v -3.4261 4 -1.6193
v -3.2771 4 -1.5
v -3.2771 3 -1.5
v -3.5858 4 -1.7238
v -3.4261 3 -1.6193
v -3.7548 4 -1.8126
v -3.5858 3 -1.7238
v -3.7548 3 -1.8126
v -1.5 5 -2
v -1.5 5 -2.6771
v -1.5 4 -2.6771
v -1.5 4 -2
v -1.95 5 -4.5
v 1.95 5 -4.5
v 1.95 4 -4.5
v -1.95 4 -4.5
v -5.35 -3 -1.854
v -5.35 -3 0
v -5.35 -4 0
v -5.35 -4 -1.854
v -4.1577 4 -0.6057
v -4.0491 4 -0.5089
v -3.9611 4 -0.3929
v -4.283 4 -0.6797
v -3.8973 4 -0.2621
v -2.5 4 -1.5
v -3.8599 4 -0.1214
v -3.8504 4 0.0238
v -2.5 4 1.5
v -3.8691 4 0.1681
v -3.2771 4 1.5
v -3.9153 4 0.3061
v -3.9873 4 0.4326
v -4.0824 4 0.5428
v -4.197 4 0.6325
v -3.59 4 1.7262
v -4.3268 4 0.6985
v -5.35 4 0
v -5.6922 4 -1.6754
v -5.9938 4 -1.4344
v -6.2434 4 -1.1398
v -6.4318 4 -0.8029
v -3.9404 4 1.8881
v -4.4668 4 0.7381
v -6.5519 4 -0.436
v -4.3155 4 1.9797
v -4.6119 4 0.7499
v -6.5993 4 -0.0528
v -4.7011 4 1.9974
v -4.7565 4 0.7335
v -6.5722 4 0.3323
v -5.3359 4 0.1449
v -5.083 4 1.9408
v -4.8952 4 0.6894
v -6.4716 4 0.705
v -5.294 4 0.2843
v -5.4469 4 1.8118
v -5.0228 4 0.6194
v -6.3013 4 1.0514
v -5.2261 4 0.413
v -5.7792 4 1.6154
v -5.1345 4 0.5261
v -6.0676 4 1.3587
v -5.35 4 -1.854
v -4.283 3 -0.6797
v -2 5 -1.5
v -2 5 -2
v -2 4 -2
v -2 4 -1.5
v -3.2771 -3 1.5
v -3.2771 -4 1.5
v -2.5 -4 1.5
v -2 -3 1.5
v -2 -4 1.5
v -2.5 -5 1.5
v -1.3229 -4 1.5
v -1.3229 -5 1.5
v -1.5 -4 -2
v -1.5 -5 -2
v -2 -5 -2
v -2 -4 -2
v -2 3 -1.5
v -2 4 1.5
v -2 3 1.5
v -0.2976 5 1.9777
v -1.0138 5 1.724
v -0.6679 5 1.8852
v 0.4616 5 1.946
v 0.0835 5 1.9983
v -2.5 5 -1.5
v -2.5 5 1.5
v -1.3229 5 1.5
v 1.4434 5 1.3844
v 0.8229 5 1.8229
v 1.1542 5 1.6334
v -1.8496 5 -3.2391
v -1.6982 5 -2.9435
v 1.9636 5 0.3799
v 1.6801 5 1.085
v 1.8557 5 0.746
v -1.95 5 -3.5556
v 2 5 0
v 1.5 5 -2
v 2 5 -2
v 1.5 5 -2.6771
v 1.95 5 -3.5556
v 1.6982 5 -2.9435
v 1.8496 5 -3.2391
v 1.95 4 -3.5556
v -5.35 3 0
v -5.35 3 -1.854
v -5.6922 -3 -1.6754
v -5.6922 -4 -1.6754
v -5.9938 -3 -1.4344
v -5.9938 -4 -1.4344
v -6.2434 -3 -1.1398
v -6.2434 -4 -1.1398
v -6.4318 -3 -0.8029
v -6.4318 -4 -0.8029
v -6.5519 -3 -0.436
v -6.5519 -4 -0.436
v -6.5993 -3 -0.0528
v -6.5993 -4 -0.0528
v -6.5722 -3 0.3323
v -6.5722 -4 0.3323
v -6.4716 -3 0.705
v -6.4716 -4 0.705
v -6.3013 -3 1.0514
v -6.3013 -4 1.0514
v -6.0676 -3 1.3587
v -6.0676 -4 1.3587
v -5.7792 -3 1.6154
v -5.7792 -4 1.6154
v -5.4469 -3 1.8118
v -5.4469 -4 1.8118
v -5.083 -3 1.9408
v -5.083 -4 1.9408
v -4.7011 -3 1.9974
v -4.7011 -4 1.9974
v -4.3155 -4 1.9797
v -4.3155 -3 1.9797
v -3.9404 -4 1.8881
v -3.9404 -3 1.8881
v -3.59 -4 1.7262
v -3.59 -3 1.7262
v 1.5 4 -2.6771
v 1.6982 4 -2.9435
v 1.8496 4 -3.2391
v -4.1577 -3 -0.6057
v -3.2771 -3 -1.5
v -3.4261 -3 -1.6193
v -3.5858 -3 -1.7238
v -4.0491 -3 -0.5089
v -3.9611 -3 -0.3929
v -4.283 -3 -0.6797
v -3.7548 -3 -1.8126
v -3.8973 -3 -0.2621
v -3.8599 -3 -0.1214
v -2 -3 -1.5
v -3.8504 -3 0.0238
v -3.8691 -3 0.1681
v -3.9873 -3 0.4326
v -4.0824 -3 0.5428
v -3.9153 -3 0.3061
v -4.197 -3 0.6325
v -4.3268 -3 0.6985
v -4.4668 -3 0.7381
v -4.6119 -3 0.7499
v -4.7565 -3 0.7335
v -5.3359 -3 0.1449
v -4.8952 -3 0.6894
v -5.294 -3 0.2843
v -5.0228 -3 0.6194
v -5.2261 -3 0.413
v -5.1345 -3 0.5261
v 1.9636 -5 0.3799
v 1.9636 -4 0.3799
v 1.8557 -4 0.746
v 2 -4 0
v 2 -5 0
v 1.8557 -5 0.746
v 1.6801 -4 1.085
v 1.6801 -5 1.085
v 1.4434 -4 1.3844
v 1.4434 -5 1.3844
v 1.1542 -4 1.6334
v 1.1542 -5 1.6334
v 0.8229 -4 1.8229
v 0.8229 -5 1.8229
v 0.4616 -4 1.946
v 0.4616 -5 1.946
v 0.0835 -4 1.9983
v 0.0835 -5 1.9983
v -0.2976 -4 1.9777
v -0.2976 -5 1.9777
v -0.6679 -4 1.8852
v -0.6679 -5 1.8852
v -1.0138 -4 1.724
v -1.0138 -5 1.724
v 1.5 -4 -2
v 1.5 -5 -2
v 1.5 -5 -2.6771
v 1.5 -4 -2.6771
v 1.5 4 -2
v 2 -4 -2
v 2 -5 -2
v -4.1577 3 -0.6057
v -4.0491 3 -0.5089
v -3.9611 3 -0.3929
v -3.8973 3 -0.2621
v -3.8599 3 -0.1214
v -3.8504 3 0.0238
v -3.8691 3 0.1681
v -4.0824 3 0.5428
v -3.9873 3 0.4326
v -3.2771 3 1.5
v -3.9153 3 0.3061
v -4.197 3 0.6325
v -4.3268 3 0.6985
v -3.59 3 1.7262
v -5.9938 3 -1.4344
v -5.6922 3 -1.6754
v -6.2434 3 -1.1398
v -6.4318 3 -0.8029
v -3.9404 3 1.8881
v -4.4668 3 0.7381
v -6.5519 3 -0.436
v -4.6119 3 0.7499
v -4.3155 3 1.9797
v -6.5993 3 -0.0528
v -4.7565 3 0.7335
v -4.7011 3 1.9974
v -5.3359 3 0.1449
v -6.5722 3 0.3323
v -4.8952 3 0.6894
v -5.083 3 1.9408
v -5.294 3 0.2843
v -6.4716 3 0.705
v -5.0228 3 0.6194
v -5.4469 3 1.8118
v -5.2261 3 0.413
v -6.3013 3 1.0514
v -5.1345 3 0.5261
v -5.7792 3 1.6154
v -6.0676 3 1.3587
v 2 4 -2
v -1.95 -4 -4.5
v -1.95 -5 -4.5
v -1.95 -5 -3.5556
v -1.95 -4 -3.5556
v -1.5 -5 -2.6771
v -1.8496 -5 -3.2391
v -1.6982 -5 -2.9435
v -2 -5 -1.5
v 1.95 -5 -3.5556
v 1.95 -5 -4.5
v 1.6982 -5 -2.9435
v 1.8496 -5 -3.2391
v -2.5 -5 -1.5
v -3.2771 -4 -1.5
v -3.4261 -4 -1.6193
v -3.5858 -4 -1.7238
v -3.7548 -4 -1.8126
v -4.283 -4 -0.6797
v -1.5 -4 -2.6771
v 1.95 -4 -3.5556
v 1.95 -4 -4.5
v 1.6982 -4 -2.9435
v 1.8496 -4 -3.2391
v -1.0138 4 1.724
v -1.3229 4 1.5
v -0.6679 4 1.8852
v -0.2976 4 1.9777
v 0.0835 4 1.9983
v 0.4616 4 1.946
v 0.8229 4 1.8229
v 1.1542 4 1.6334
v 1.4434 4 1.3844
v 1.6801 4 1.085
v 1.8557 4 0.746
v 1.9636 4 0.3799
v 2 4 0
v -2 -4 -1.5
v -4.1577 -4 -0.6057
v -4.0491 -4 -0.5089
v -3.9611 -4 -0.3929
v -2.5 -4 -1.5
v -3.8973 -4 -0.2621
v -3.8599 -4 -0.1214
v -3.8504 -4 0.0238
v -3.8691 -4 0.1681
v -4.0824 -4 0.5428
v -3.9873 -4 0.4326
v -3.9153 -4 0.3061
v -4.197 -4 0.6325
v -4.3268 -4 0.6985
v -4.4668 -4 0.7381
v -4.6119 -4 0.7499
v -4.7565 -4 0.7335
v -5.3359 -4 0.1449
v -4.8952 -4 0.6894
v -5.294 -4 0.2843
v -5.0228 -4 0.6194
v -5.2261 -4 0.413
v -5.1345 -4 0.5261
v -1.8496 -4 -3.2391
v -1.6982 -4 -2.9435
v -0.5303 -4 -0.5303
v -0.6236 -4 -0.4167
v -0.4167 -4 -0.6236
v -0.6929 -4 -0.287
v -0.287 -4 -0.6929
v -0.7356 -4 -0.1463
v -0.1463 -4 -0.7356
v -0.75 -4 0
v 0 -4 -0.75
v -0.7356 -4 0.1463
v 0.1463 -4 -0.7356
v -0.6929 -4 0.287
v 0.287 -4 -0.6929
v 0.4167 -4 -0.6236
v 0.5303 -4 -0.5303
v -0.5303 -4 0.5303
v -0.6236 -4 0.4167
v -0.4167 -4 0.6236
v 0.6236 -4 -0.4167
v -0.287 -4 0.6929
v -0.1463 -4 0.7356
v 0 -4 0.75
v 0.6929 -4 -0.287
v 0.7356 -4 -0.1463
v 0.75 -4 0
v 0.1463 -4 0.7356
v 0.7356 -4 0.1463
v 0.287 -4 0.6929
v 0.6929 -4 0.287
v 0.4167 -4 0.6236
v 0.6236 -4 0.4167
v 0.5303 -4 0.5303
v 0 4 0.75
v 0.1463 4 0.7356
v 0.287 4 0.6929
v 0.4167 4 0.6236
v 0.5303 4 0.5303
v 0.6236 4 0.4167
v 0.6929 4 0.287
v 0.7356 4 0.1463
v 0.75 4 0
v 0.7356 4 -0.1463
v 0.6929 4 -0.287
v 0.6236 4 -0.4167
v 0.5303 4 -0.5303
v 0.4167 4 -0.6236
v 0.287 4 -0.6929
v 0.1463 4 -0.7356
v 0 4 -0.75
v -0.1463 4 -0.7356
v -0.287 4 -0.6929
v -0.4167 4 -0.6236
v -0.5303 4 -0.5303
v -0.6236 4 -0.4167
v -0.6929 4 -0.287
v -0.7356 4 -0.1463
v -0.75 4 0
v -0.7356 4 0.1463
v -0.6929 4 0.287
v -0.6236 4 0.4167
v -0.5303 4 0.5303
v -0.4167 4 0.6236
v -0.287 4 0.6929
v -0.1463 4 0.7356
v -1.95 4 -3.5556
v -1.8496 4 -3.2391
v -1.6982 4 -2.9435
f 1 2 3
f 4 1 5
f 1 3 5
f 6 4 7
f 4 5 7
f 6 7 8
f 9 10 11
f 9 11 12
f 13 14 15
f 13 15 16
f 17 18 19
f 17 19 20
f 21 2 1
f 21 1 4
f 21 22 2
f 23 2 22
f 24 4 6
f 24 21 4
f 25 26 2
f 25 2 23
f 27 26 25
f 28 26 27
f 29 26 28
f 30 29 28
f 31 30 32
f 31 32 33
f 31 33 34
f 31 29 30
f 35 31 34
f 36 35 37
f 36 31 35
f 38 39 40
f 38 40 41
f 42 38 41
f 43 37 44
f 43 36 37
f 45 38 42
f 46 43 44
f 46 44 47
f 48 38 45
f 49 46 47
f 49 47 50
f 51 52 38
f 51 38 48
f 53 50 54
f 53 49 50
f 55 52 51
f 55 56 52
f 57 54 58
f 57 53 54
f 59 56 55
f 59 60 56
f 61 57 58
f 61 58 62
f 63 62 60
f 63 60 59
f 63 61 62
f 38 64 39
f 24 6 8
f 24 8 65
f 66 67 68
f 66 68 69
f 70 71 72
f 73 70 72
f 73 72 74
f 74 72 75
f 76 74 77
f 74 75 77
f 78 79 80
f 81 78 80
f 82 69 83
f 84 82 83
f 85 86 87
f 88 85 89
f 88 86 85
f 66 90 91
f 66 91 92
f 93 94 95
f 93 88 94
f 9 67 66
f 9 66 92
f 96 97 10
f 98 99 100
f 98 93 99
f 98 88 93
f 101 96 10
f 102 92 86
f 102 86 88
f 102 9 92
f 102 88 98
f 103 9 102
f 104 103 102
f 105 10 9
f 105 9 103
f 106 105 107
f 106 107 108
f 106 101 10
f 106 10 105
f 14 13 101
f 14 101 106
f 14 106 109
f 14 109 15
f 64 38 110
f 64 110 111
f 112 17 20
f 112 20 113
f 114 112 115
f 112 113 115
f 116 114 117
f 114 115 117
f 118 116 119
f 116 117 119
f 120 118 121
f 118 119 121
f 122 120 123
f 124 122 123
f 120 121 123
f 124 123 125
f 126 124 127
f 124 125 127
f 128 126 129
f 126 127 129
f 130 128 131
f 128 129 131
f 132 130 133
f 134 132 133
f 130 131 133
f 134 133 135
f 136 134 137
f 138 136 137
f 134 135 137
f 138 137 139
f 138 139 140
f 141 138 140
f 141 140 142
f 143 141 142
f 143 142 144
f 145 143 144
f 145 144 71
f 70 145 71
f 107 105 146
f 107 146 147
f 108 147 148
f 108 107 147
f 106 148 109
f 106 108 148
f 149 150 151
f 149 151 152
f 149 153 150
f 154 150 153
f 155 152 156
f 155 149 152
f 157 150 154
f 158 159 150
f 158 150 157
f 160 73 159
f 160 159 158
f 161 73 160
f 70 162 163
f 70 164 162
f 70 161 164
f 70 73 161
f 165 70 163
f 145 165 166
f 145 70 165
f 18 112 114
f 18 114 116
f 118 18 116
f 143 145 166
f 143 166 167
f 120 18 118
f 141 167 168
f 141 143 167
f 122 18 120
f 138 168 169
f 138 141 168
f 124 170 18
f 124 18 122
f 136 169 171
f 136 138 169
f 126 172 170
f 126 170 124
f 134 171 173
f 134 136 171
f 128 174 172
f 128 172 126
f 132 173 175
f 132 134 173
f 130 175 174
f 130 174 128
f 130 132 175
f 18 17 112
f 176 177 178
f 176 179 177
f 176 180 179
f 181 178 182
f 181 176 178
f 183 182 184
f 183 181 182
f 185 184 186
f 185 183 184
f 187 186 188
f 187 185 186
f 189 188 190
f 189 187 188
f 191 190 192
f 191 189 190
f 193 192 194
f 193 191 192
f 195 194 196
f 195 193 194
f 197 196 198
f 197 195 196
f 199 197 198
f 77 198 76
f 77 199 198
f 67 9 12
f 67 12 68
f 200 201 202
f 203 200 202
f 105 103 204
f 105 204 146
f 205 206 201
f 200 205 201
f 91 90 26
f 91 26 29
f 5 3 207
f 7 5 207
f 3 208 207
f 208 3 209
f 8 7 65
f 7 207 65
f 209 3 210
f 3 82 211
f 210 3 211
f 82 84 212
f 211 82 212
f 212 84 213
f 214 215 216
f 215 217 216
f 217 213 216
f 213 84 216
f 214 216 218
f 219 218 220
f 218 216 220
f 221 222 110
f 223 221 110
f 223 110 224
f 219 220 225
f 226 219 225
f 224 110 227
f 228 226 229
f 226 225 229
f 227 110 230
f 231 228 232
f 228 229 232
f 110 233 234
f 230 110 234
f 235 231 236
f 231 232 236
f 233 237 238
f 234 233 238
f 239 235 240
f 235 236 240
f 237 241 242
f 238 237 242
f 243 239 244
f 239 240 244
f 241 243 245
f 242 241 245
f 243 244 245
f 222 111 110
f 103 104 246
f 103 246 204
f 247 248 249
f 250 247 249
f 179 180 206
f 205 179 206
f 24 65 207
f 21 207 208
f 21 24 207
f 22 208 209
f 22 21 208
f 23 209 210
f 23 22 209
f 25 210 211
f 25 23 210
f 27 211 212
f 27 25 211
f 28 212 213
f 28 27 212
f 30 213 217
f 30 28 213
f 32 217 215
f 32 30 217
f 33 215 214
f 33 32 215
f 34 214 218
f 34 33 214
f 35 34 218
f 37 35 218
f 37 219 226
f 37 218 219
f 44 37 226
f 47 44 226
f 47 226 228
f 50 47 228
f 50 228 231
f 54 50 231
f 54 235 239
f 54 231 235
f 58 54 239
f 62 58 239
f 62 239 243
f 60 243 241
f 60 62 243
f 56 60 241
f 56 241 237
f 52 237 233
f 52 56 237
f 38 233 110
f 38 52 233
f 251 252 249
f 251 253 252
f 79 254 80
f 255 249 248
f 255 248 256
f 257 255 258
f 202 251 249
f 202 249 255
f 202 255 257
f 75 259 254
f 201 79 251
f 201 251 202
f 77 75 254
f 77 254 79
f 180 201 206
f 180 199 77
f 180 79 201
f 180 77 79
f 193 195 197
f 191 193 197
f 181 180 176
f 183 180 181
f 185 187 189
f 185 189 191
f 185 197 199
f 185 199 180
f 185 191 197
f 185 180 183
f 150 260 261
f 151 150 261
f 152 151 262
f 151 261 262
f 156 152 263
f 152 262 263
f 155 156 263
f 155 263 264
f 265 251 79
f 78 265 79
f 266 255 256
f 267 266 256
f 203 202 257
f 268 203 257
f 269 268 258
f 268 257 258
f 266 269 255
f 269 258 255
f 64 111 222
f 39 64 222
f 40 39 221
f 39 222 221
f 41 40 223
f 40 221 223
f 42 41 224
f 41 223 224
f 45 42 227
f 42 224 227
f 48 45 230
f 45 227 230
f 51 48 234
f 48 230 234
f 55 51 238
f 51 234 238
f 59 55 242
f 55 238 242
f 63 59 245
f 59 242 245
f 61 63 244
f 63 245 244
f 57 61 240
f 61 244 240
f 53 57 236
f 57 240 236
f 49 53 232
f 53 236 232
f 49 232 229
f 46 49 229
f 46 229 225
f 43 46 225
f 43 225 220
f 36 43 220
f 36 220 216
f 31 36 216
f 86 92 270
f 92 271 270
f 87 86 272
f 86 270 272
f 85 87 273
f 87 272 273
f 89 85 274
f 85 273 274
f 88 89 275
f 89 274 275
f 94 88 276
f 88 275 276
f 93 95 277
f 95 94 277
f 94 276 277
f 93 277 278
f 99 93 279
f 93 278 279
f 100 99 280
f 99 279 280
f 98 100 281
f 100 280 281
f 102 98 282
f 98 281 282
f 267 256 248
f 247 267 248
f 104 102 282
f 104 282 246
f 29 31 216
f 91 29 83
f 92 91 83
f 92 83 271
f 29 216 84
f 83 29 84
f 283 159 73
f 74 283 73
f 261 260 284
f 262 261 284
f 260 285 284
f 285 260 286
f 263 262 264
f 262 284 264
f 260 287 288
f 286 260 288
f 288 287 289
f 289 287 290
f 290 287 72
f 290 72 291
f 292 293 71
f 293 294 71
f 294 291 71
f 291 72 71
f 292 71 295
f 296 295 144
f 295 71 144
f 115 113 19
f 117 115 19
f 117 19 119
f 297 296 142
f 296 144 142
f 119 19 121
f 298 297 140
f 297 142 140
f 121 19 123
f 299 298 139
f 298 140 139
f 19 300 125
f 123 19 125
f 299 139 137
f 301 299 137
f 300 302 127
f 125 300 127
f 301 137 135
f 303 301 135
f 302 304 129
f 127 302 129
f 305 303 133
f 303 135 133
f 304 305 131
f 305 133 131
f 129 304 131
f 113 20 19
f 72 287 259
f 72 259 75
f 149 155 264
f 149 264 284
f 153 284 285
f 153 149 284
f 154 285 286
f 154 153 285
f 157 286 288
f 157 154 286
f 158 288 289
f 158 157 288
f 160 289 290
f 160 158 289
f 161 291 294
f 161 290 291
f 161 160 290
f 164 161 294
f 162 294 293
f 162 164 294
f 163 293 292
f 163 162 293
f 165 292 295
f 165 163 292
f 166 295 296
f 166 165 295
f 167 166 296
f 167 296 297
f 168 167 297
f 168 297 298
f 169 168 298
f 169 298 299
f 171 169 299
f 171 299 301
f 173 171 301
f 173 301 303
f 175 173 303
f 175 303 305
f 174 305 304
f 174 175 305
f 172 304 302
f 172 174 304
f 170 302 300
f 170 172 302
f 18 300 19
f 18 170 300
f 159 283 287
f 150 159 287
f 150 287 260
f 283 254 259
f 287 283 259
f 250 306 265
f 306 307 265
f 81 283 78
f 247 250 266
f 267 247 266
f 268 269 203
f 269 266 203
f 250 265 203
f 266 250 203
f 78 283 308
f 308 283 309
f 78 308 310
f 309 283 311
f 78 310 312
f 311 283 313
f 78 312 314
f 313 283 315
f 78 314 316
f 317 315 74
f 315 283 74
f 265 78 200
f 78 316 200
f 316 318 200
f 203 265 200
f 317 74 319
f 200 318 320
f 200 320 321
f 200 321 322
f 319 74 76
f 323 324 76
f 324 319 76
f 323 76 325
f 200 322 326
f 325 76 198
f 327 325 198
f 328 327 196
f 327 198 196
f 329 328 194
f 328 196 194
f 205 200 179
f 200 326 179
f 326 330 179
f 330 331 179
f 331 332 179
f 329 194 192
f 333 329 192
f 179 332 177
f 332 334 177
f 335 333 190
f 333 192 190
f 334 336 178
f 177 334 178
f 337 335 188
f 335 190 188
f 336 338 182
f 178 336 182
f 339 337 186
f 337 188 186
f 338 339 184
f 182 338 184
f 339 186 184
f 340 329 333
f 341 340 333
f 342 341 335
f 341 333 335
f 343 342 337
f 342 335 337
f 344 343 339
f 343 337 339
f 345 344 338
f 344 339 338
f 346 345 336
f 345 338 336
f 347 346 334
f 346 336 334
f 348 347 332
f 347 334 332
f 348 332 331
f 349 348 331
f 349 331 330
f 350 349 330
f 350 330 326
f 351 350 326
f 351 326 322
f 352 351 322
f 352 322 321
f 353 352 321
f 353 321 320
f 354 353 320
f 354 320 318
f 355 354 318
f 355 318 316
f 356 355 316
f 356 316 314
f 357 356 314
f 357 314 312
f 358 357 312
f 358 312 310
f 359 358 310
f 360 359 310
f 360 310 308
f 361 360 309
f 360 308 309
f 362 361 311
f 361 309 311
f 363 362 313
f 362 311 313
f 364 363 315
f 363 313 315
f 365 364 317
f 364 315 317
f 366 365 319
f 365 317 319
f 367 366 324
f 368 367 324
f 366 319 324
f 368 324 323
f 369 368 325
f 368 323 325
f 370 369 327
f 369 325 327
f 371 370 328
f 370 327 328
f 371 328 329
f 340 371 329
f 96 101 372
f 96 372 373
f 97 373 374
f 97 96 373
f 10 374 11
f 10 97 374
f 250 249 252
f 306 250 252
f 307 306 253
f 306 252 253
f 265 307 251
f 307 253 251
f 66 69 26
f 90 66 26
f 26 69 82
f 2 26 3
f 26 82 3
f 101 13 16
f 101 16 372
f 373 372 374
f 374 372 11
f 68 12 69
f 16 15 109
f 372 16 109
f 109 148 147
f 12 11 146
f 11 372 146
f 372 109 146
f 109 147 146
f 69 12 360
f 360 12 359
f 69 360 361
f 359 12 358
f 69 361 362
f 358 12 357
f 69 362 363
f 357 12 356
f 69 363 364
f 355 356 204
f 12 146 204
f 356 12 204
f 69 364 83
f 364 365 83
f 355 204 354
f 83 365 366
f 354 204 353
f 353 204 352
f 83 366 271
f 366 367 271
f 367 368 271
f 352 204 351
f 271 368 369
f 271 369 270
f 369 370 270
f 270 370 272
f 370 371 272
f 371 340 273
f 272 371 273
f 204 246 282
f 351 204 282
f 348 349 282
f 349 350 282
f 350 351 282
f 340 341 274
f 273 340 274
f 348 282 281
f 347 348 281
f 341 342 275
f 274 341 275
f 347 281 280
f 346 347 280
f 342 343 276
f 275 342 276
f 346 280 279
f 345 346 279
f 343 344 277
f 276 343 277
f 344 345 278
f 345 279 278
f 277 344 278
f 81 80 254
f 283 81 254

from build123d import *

# Parameters (mm, degrees)
EXTRUDE_1_DEPTH      = 4
EXTRUDE_1_DEPTH_BACK = 4
SKETCH_1_R           = 0.75
SKETCH_2_R           = 2
EXTRUDE_2_DEPTH      = 1
EXTRUDE_START        = 1
SKETCH_3_R           = 2
EXTRUDE_3_DEPTH      = 1
SKETCH_6_W           = 1.5
SKETCH_6_H           = 3
EXTRUDE_6_DEPTH      = 1
SKETCH_7_W           = 1.5
SKETCH_7_H           = 3
EXTRUDE_8_DEPTH      = 1
SKETCH_8_W           = 3
SKETCH_8_H           = 2
EXTRUDE_9_DEPTH      = 0.5
EXTRUDE_10_DEPTH     = 1
EXTRUDE_START_2      = 7
EXTRUDE_11_DEPTH     = 1
CUT_EXTRUDE_1_DEPTH  = 12.338430226
EXTRUDE_12_DEPTH     = 1


with BuildPart() as part:
    # 草图1 → 凸台-拉伸1 (new, two sides: drawn at the far end of the back side and taken through both)
    with BuildSketch(Plane(origin=(0, 0, 0), x_dir=(1, 0, 0), z_dir=(0, 1, 0)).offset(-EXTRUDE_1_DEPTH_BACK)):
        with Locations(Location((0, 0, 0), (0, 0, 270))):
            Circle(SKETCH_1_R)
    extrude(amount=EXTRUDE_1_DEPTH + EXTRUDE_1_DEPTH_BACK)

    # 草图2 → 凸台-拉伸2 (add)
    with BuildSketch(Plane(origin=(0, 4, 0), x_dir=(-1, 0, 0), z_dir=(0, 1, 0))):
        with Locations(Location((0, 0, 0), (0, 0, 90))):
            Circle(SKETCH_2_R)
    extrude(amount=EXTRUDE_2_DEPTH)

    # 草图3 → 凸台-拉伸3 (add)
    with BuildSketch(Plane.XZ.offset(4).offset(EXTRUDE_START)):
        with Locations(Location((0, 0, 0), (0, 0, 90))):
            Circle(SKETCH_3_R)
    extrude(amount=-EXTRUDE_3_DEPTH)

    # 草图6 → 凸台-拉伸6 (add)
    with BuildSketch(Plane(origin=(0, 5, 0), x_dir=(-1, 0, 0), z_dir=(0, 1, 0))):
        with Locations((1.75, 0)):
            Rectangle(SKETCH_6_W, SKETCH_6_H)
    extrude(amount=-EXTRUDE_6_DEPTH)

    # 草图7 → 凸台-拉伸8 (add)
    with BuildSketch(Plane.XZ.offset(5)):
        with Locations((-1.75, 0)):
            Rectangle(SKETCH_7_W, SKETCH_7_H)
    extrude(amount=-EXTRUDE_8_DEPTH)

    # 草图8 → 凸台-拉伸9 (add)
    with BuildSketch(Plane.ZY.offset(2.5)):
        with Locations((0, 4)):
            Rectangle(SKETCH_8_W, SKETCH_8_H)
        with Locations((0, -4)):
            Rectangle(SKETCH_8_W, SKETCH_8_H)
    extrude(amount=-EXTRUDE_9_DEPTH)

    # 草图9 → 凸台-拉伸10 (add)
    with BuildSketch(Plane.XZ.offset(-3)):
        with BuildLine():
            Line((-2.5, -1.5), (-3.277124344, -1.5))
            ThreePointArc((-3.277124344, -1.5), (-6.6, 0), (-3.277124344, 1.5))
            Line((-3.277124344, 1.5), (-2.5, 1.5))
            Line((-2.5, 1.5), (-2.5, -1.5))
        make_face()
    extrude(amount=-EXTRUDE_10_DEPTH)

    # 草图9<2> → 凸台-拉伸11 (add)
    with BuildSketch(Plane.XZ.offset(-3).offset(EXTRUDE_START_2)):
        with BuildLine():
            Line((-2.5, -1.5), (-3.277124344, -1.5))
            ThreePointArc((-3.277124344, -1.5), (-6.6, 0), (-3.277124344, 1.5))
            Line((-3.277124344, 1.5), (-2.5, 1.5))
            Line((-2.5, 1.5), (-2.5, -1.5))
        make_face()
    extrude(amount=-EXTRUDE_11_DEPTH)

    # 草图10 → 切除-拉伸1 (cut, through all)
    with BuildSketch(Plane(origin=(0, 4, 0), x_dir=(-1, 0, 0), z_dir=(0, 1, 0))):
        with BuildLine():
            Line((5.35, 0), (5.35, -1.854049622))
            ThreePointArc((5.35, -1.854049622), (4.548070298, -1.999325713), (3.754763477, -1.812615574))
            Line((3.754763477, -1.812615574), (4.283036304, -0.67973084))
            ThreePointArc((4.283036304, -0.67973084), (4.197025294, 0.632543584), (5.35, 0))
        make_face()
    extrude(amount=-CUT_EXTRUDE_1_DEPTH, mode=Mode.SUBTRACT)

    # 草图11 → 凸台-拉伸12 (add)
    with BuildSketch(Plane(origin=(0, 5, 0), x_dir=(1, 0, 0), z_dir=(0, 1, 0))):
        with BuildLine():
            Line((-2, 0), (2, 0))
            Line((2, 0), (2, 2))
            Line((2, 2), (1.5, 2))
            Line((1.5, 2), (1.5, 2.677124344))
            ThreePointArc((1.5, 2.677124344), (1.780042303, 3.088161527), (1.95, 3.555590279))
            Line((1.95, 3.555590279), (1.95, 4.5))
            Line((1.95, 4.5), (-1.95, 4.5))
            Line((-1.95, 4.5), (-1.95, 3.555590279))
            ThreePointArc((-1.95, 3.555590279), (-1.780042303, 3.088161527), (-1.5, 2.677124344))
            Line((-1.5, 2.677124344), (-1.5, 2))
            Line((-1.5, 2), (-2, 2))
            Line((-2, 2), (-2, 0))
        make_face()
    extrude_12 = extrude(amount=-EXTRUDE_12_DEPTH)

    # 镜向1: 凸台-拉伸12 across plane
    add(extrude_12.mirror(Plane.ZX))


solid = part.part
